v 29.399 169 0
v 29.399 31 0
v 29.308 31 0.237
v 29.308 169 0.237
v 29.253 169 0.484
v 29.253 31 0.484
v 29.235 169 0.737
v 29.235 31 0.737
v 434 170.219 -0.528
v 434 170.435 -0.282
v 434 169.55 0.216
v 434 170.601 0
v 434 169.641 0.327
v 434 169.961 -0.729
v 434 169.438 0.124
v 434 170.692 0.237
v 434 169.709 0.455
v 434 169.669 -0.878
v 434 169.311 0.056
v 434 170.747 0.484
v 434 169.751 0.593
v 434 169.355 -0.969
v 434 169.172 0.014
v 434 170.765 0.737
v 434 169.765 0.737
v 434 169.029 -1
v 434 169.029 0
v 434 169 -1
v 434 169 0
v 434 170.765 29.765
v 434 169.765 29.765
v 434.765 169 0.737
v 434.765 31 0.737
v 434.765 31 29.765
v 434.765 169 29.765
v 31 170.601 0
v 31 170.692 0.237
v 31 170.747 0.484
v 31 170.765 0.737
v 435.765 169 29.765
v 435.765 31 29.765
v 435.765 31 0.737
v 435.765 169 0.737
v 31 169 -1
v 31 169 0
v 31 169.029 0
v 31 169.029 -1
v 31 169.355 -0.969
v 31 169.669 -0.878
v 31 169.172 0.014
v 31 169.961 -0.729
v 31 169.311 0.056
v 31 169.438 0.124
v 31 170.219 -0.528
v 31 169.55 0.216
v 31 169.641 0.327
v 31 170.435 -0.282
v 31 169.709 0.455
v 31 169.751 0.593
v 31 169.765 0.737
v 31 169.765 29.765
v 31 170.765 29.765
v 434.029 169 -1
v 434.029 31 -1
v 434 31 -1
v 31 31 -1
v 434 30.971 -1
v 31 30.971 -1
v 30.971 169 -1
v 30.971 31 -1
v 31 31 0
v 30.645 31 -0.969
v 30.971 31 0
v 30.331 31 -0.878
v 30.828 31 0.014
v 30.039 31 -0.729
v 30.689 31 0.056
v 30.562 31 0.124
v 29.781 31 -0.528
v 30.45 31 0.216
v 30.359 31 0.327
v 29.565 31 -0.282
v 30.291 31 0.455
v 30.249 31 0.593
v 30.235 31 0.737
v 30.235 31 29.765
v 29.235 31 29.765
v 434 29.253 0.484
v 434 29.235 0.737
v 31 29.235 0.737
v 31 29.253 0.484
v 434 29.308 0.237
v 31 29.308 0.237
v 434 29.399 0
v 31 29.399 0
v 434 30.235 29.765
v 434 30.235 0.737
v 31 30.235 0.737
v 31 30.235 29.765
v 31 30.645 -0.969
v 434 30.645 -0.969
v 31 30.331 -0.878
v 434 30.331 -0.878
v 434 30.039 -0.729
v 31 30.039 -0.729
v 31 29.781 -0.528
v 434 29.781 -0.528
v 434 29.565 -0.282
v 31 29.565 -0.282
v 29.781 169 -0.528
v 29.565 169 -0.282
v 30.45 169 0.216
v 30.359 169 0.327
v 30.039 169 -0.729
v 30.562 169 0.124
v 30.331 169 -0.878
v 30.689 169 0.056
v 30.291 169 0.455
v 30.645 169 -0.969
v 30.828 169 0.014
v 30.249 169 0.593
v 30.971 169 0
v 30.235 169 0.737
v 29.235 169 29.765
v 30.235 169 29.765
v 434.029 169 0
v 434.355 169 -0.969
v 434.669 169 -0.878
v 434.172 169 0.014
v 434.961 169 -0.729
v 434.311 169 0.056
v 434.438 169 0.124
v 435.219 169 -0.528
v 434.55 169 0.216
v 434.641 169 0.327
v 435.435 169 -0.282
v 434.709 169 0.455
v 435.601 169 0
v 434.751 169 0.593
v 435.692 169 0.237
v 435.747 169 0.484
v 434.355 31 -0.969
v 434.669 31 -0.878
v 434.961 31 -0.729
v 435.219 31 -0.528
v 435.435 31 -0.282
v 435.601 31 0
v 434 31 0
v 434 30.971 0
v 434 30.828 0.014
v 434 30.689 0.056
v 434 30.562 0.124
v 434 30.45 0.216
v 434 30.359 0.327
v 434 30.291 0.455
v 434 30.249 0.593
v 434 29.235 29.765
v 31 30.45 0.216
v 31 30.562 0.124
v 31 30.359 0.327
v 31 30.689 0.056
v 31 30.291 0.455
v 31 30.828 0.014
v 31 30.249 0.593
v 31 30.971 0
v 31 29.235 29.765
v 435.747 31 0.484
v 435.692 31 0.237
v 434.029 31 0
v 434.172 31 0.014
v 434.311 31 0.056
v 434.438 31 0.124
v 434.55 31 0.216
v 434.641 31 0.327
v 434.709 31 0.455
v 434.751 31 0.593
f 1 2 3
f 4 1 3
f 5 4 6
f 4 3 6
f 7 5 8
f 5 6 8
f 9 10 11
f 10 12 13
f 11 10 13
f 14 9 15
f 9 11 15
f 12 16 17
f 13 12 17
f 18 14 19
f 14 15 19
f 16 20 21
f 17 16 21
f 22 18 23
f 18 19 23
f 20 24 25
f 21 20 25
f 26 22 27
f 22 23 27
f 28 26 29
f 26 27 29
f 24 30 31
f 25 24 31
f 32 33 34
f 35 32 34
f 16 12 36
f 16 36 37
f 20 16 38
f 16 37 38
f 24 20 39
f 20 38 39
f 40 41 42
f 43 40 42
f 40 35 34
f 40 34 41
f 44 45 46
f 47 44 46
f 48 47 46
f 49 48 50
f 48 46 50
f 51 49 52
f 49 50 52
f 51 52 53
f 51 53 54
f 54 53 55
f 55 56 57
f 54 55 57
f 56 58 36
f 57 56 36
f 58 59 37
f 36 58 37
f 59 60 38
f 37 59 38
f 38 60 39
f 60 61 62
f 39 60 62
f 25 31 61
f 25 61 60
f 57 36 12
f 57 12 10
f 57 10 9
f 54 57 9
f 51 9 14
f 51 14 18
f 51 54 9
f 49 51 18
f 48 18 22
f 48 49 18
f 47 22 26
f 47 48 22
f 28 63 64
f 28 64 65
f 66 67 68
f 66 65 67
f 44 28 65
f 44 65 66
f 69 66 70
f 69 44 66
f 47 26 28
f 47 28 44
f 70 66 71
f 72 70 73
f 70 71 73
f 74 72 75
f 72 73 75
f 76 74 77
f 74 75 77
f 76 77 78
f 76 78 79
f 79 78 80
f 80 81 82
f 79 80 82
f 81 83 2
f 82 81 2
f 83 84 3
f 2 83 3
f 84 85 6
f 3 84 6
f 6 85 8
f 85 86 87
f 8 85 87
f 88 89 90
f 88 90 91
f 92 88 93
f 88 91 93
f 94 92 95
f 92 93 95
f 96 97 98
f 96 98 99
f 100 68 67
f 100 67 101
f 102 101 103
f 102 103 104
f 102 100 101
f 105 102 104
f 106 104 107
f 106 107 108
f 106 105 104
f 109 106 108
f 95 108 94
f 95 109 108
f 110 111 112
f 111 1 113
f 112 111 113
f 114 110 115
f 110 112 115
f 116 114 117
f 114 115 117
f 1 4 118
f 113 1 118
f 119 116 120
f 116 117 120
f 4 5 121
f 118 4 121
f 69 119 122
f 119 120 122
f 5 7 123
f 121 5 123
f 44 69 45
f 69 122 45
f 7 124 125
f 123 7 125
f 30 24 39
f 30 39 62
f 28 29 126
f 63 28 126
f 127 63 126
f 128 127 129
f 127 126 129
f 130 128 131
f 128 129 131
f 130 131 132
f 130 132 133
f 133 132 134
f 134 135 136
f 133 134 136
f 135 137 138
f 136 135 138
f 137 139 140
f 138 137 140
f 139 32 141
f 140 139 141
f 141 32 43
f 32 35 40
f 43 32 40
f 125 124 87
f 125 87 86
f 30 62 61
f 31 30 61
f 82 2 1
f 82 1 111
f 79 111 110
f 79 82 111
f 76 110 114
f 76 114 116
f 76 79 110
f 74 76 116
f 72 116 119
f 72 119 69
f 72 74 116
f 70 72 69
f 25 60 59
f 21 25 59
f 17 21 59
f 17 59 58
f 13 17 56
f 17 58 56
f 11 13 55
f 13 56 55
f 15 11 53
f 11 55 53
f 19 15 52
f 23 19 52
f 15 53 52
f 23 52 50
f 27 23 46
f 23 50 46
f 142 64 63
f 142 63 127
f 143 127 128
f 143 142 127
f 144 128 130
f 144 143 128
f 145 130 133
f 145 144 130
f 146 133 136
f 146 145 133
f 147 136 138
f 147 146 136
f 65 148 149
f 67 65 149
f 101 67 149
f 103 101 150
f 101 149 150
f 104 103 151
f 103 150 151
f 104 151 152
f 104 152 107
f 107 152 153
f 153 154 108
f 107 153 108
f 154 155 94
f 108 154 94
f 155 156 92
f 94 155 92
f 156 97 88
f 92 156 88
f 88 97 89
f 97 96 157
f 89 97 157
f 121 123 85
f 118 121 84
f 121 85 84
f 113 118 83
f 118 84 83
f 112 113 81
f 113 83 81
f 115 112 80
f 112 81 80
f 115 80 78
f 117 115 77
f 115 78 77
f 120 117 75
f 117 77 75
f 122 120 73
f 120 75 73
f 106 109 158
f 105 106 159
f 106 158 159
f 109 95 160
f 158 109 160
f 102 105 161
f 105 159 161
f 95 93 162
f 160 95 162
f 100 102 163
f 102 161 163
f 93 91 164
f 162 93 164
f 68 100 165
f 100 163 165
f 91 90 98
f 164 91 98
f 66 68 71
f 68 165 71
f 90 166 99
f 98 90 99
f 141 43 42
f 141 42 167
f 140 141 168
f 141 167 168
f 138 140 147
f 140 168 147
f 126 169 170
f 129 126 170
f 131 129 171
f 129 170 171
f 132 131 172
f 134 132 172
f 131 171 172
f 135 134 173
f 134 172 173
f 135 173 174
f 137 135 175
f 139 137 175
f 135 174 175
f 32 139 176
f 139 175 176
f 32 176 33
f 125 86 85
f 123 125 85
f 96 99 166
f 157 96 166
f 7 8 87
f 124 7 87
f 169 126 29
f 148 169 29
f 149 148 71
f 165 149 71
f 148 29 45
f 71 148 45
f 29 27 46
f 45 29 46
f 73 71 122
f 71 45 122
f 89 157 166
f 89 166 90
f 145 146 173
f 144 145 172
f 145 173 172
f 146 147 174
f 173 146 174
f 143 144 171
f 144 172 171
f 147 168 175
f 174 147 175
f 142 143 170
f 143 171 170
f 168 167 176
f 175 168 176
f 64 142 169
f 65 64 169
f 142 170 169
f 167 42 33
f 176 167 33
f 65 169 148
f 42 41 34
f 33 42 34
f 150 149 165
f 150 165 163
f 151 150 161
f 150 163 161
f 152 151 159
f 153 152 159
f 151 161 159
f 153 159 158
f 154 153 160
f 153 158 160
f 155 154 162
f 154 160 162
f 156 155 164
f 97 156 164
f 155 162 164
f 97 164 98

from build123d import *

# Parameters (mm, degrees)
BASE_FLANGE1_DEPTH         = 1
SKETCHED_START             = 31
SKETCHED_BEND1_DEPTH       = 138
SKETCHED_BEND1_2_DEPTH     = 403
SKETCHED_BEND1_3_OUTLINE_W = 403
SKETCHED_BEND1_3_OUTLINE_H = 1
SKETCHED_BEND1_3_DEPTH     = 29.234623369
SKETCHED_START_2           = 170.765376631
SKETCHED_BEND1_4_OUTLINE_W = 403
SKETCHED_BEND1_4_OUTLINE_H = 1
SKETCHED_BEND1_4_DEPTH     = 29.234623369
SKETCHED_BEND1_5_DEPTH     = 138
SKETCHED_BEND1_6_DEPTH     = 403
SKETCHED_BEND1_7_OUTLINE_W = 138
SKETCHED_BEND1_7_OUTLINE_H = 1
SKETCHED_BEND1_7_DEPTH     = 29.234623369
SKETCHED_START_3           = 435.765376631
SKETCHED_BEND1_8_OUTLINE_W = 138
SKETCHED_BEND1_8_OUTLINE_H = 1
SKETCHED_BEND1_8_DEPTH     = 29.234623369


# Read off the part's stored shape, not the designer's step: Sketched Bend1
# Sheet-metal steps are written as plain solids
with BuildPart() as part:
    # Sketch1 → Base-Flange1 (new body)
    with BuildSketch(Plane.XY):
        Polygon((0, 169), (31, 169), (31, 200), (434, 200), (434, 169), (465, 169), (465, 31), (434, 31), (434, 0), (31, 0), (31, 31), (0, 31), align=None)
    extrude(amount=-BASE_FLANGE1_DEPTH)

    # Sketched Bend1 outline → Sketched Bend1 (add)
    with BuildSketch(Plane(origin=(0, 0, 0), x_dir=(1, 0, 0), z_dir=(0, 1, 0)).offset(SKETCHED_START)):
        with BuildLine():
            Line((29.234623369, -0.7366), (29.234623369, -29.765376631))
            Line((29.234623369, -29.765376631), (30.234623369, -29.765376631))
            Line((30.234623369, -29.765376631), (30.234623369, -0.7366))
            ThreePointArc((30.234623369, -0.7366), (30.450368514, -0.215745145), (30.971223369, 0))
            Line((30.971223369, 0), (29.398582279, 0))
            ThreePointArc((29.398582279, 0), (29.276108612, -0.359286442), (29.234623369, -0.7366))
        make_face()
        with BuildLine():
            Line((435.601417721, 0), (434.028776631, 0))
            ThreePointArc((434.028776631, 0), (434.549631486, -0.215745145), (434.765376631, -0.7366))
            Line((434.765376631, -0.7366), (434.765376631, -29.765376631))
            Line((434.765376631, -29.765376631), (435.765376631, -29.765376631))
            Line((435.765376631, -29.765376631), (435.765376631, -0.7366))
            ThreePointArc((435.765376631, -0.7366), (435.723891388, -0.359286442), (435.601417721, 0))
        make_face()
    extrude(amount=SKETCHED_BEND1_DEPTH)

    # Sketched Bend1 2 outline → Sketched Bend1 2 (add)
    with BuildSketch(Plane.YZ.offset(SKETCHED_START)):
        with BuildLine():
            Line((169.028776631, 0), (170.601417721, 0))
            ThreePointArc((170.601417721, 0), (170.723891388, 0.359286442), (170.765376631, 0.7366))
            Line((170.765376631, 0.7366), (170.765376631, 29.765376631))
            Line((170.765376631, 29.765376631), (169.765376631, 29.765376631))
            Line((169.765376631, 29.765376631), (169.765376631, 0.7366))
            ThreePointArc((169.765376631, 0.7366), (169.549631486, 0.215745145), (169.028776631, 0))
        make_face()
        with BuildLine():
            ThreePointArc((29.234623369, 0.7366), (29.276108612, 0.359286442), (29.398582279, 0))
            Line((29.398582279, 0), (30.971223369, 0))
            ThreePointArc((30.971223369, 0), (30.450368514, 0.215745145), (30.234623369, 0.7366))
            Line((30.234623369, 0.7366), (30.234623369, 29.765376631))
            Line((30.234623369, 29.765376631), (29.234623369, 29.765376631))
            Line((29.234623369, 29.765376631), (29.234623369, 0.7366))
        make_face()
    extrude(amount=SKETCHED_BEND1_2_DEPTH)

    # Sketched Bend1 3 outline → Sketched Bend1 3 (cut)
    with BuildSketch(Plane(origin=(0, 0, 0), x_dir=(1, 0, 0), z_dir=(0, 1, 0))):
        with Locations((232.5, 0.5)):
            Rectangle(SKETCHED_BEND1_3_OUTLINE_W, SKETCHED_BEND1_3_OUTLINE_H)
    extrude(amount=SKETCHED_BEND1_3_DEPTH, mode=Mode.SUBTRACT)

    # Sketched Bend1 4 outline → Sketched Bend1 4 (cut)
    with BuildSketch(Plane(origin=(0, 0, 0), x_dir=(1, 0, 0), z_dir=(0, 1, 0)).offset(SKETCHED_START_2)):
        with Locations((232.5, 0.5)):
            Rectangle(SKETCHED_BEND1_4_OUTLINE_W, SKETCHED_BEND1_4_OUTLINE_H)
    extrude(amount=SKETCHED_BEND1_4_DEPTH, mode=Mode.SUBTRACT)

    # Sketched Bend1 5 outline → Sketched Bend1 5 (cut)
    with BuildSketch(Plane(origin=(0, 0, 0), x_dir=(1, 0, 0), z_dir=(0, 1, 0)).offset(SKETCHED_START)):
        with BuildLine():
            Line((0, 0), (29.398582279, 0))
            ThreePointArc((29.398582279, 0), (30.039397205, 0.728828115), (30.971223369, 1))
            Line((30.971223369, 1), (0, 1))
            Line((0, 1), (0, 0))
        make_face()
        with BuildLine():
            Line((465, 1), (434.028776631, 1))
            ThreePointArc((434.028776631, 1), (434.960602795, 0.728828115), (435.601417721, 0))
            Line((435.601417721, 0), (465, 0))
            Line((465, 0), (465, 1))
        make_face()
    extrude(amount=SKETCHED_BEND1_5_DEPTH, mode=Mode.SUBTRACT)

    # Sketched Bend1 6 outline → Sketched Bend1 6 (cut)
    with BuildSketch(Plane.YZ.offset(SKETCHED_START)):
        with BuildLine():
            ThreePointArc((170.601417721, 0), (169.960602795, -0.728828115), (169.028776631, -1))
            Line((169.028776631, -1), (200, -1))
            Line((200, -1), (200, 0))
            Line((200, 0), (170.601417721, 0))
        make_face()
        with BuildLine():
            Line((0, -1), (30.971223369, -1))
            ThreePointArc((30.971223369, -1), (30.039397205, -0.728828115), (29.398582279, 0))
            Line((29.398582279, 0), (0, 0))
            Line((0, 0), (0, -1))
        make_face()
    extrude(amount=SKETCHED_BEND1_6_DEPTH, mode=Mode.SUBTRACT)

    # Sketched Bend1 7 outline → Sketched Bend1 7 (cut)
    with BuildSketch(Plane.YZ):
        with Locations((100, -0.5)):
            Rectangle(SKETCHED_BEND1_7_OUTLINE_W, SKETCHED_BEND1_7_OUTLINE_H)
    extrude(amount=SKETCHED_BEND1_7_DEPTH, mode=Mode.SUBTRACT)

    # Sketched Bend1 8 outline → Sketched Bend1 8 (cut)
    with BuildSketch(Plane.YZ.offset(SKETCHED_START_3)):
        with Locations((100, -0.5)):
            Rectangle(SKETCHED_BEND1_8_OUTLINE_W, SKETCHED_BEND1_8_OUTLINE_H)
    extrude(amount=SKETCHED_BEND1_8_DEPTH, mode=Mode.SUBTRACT)


solid = part.part
